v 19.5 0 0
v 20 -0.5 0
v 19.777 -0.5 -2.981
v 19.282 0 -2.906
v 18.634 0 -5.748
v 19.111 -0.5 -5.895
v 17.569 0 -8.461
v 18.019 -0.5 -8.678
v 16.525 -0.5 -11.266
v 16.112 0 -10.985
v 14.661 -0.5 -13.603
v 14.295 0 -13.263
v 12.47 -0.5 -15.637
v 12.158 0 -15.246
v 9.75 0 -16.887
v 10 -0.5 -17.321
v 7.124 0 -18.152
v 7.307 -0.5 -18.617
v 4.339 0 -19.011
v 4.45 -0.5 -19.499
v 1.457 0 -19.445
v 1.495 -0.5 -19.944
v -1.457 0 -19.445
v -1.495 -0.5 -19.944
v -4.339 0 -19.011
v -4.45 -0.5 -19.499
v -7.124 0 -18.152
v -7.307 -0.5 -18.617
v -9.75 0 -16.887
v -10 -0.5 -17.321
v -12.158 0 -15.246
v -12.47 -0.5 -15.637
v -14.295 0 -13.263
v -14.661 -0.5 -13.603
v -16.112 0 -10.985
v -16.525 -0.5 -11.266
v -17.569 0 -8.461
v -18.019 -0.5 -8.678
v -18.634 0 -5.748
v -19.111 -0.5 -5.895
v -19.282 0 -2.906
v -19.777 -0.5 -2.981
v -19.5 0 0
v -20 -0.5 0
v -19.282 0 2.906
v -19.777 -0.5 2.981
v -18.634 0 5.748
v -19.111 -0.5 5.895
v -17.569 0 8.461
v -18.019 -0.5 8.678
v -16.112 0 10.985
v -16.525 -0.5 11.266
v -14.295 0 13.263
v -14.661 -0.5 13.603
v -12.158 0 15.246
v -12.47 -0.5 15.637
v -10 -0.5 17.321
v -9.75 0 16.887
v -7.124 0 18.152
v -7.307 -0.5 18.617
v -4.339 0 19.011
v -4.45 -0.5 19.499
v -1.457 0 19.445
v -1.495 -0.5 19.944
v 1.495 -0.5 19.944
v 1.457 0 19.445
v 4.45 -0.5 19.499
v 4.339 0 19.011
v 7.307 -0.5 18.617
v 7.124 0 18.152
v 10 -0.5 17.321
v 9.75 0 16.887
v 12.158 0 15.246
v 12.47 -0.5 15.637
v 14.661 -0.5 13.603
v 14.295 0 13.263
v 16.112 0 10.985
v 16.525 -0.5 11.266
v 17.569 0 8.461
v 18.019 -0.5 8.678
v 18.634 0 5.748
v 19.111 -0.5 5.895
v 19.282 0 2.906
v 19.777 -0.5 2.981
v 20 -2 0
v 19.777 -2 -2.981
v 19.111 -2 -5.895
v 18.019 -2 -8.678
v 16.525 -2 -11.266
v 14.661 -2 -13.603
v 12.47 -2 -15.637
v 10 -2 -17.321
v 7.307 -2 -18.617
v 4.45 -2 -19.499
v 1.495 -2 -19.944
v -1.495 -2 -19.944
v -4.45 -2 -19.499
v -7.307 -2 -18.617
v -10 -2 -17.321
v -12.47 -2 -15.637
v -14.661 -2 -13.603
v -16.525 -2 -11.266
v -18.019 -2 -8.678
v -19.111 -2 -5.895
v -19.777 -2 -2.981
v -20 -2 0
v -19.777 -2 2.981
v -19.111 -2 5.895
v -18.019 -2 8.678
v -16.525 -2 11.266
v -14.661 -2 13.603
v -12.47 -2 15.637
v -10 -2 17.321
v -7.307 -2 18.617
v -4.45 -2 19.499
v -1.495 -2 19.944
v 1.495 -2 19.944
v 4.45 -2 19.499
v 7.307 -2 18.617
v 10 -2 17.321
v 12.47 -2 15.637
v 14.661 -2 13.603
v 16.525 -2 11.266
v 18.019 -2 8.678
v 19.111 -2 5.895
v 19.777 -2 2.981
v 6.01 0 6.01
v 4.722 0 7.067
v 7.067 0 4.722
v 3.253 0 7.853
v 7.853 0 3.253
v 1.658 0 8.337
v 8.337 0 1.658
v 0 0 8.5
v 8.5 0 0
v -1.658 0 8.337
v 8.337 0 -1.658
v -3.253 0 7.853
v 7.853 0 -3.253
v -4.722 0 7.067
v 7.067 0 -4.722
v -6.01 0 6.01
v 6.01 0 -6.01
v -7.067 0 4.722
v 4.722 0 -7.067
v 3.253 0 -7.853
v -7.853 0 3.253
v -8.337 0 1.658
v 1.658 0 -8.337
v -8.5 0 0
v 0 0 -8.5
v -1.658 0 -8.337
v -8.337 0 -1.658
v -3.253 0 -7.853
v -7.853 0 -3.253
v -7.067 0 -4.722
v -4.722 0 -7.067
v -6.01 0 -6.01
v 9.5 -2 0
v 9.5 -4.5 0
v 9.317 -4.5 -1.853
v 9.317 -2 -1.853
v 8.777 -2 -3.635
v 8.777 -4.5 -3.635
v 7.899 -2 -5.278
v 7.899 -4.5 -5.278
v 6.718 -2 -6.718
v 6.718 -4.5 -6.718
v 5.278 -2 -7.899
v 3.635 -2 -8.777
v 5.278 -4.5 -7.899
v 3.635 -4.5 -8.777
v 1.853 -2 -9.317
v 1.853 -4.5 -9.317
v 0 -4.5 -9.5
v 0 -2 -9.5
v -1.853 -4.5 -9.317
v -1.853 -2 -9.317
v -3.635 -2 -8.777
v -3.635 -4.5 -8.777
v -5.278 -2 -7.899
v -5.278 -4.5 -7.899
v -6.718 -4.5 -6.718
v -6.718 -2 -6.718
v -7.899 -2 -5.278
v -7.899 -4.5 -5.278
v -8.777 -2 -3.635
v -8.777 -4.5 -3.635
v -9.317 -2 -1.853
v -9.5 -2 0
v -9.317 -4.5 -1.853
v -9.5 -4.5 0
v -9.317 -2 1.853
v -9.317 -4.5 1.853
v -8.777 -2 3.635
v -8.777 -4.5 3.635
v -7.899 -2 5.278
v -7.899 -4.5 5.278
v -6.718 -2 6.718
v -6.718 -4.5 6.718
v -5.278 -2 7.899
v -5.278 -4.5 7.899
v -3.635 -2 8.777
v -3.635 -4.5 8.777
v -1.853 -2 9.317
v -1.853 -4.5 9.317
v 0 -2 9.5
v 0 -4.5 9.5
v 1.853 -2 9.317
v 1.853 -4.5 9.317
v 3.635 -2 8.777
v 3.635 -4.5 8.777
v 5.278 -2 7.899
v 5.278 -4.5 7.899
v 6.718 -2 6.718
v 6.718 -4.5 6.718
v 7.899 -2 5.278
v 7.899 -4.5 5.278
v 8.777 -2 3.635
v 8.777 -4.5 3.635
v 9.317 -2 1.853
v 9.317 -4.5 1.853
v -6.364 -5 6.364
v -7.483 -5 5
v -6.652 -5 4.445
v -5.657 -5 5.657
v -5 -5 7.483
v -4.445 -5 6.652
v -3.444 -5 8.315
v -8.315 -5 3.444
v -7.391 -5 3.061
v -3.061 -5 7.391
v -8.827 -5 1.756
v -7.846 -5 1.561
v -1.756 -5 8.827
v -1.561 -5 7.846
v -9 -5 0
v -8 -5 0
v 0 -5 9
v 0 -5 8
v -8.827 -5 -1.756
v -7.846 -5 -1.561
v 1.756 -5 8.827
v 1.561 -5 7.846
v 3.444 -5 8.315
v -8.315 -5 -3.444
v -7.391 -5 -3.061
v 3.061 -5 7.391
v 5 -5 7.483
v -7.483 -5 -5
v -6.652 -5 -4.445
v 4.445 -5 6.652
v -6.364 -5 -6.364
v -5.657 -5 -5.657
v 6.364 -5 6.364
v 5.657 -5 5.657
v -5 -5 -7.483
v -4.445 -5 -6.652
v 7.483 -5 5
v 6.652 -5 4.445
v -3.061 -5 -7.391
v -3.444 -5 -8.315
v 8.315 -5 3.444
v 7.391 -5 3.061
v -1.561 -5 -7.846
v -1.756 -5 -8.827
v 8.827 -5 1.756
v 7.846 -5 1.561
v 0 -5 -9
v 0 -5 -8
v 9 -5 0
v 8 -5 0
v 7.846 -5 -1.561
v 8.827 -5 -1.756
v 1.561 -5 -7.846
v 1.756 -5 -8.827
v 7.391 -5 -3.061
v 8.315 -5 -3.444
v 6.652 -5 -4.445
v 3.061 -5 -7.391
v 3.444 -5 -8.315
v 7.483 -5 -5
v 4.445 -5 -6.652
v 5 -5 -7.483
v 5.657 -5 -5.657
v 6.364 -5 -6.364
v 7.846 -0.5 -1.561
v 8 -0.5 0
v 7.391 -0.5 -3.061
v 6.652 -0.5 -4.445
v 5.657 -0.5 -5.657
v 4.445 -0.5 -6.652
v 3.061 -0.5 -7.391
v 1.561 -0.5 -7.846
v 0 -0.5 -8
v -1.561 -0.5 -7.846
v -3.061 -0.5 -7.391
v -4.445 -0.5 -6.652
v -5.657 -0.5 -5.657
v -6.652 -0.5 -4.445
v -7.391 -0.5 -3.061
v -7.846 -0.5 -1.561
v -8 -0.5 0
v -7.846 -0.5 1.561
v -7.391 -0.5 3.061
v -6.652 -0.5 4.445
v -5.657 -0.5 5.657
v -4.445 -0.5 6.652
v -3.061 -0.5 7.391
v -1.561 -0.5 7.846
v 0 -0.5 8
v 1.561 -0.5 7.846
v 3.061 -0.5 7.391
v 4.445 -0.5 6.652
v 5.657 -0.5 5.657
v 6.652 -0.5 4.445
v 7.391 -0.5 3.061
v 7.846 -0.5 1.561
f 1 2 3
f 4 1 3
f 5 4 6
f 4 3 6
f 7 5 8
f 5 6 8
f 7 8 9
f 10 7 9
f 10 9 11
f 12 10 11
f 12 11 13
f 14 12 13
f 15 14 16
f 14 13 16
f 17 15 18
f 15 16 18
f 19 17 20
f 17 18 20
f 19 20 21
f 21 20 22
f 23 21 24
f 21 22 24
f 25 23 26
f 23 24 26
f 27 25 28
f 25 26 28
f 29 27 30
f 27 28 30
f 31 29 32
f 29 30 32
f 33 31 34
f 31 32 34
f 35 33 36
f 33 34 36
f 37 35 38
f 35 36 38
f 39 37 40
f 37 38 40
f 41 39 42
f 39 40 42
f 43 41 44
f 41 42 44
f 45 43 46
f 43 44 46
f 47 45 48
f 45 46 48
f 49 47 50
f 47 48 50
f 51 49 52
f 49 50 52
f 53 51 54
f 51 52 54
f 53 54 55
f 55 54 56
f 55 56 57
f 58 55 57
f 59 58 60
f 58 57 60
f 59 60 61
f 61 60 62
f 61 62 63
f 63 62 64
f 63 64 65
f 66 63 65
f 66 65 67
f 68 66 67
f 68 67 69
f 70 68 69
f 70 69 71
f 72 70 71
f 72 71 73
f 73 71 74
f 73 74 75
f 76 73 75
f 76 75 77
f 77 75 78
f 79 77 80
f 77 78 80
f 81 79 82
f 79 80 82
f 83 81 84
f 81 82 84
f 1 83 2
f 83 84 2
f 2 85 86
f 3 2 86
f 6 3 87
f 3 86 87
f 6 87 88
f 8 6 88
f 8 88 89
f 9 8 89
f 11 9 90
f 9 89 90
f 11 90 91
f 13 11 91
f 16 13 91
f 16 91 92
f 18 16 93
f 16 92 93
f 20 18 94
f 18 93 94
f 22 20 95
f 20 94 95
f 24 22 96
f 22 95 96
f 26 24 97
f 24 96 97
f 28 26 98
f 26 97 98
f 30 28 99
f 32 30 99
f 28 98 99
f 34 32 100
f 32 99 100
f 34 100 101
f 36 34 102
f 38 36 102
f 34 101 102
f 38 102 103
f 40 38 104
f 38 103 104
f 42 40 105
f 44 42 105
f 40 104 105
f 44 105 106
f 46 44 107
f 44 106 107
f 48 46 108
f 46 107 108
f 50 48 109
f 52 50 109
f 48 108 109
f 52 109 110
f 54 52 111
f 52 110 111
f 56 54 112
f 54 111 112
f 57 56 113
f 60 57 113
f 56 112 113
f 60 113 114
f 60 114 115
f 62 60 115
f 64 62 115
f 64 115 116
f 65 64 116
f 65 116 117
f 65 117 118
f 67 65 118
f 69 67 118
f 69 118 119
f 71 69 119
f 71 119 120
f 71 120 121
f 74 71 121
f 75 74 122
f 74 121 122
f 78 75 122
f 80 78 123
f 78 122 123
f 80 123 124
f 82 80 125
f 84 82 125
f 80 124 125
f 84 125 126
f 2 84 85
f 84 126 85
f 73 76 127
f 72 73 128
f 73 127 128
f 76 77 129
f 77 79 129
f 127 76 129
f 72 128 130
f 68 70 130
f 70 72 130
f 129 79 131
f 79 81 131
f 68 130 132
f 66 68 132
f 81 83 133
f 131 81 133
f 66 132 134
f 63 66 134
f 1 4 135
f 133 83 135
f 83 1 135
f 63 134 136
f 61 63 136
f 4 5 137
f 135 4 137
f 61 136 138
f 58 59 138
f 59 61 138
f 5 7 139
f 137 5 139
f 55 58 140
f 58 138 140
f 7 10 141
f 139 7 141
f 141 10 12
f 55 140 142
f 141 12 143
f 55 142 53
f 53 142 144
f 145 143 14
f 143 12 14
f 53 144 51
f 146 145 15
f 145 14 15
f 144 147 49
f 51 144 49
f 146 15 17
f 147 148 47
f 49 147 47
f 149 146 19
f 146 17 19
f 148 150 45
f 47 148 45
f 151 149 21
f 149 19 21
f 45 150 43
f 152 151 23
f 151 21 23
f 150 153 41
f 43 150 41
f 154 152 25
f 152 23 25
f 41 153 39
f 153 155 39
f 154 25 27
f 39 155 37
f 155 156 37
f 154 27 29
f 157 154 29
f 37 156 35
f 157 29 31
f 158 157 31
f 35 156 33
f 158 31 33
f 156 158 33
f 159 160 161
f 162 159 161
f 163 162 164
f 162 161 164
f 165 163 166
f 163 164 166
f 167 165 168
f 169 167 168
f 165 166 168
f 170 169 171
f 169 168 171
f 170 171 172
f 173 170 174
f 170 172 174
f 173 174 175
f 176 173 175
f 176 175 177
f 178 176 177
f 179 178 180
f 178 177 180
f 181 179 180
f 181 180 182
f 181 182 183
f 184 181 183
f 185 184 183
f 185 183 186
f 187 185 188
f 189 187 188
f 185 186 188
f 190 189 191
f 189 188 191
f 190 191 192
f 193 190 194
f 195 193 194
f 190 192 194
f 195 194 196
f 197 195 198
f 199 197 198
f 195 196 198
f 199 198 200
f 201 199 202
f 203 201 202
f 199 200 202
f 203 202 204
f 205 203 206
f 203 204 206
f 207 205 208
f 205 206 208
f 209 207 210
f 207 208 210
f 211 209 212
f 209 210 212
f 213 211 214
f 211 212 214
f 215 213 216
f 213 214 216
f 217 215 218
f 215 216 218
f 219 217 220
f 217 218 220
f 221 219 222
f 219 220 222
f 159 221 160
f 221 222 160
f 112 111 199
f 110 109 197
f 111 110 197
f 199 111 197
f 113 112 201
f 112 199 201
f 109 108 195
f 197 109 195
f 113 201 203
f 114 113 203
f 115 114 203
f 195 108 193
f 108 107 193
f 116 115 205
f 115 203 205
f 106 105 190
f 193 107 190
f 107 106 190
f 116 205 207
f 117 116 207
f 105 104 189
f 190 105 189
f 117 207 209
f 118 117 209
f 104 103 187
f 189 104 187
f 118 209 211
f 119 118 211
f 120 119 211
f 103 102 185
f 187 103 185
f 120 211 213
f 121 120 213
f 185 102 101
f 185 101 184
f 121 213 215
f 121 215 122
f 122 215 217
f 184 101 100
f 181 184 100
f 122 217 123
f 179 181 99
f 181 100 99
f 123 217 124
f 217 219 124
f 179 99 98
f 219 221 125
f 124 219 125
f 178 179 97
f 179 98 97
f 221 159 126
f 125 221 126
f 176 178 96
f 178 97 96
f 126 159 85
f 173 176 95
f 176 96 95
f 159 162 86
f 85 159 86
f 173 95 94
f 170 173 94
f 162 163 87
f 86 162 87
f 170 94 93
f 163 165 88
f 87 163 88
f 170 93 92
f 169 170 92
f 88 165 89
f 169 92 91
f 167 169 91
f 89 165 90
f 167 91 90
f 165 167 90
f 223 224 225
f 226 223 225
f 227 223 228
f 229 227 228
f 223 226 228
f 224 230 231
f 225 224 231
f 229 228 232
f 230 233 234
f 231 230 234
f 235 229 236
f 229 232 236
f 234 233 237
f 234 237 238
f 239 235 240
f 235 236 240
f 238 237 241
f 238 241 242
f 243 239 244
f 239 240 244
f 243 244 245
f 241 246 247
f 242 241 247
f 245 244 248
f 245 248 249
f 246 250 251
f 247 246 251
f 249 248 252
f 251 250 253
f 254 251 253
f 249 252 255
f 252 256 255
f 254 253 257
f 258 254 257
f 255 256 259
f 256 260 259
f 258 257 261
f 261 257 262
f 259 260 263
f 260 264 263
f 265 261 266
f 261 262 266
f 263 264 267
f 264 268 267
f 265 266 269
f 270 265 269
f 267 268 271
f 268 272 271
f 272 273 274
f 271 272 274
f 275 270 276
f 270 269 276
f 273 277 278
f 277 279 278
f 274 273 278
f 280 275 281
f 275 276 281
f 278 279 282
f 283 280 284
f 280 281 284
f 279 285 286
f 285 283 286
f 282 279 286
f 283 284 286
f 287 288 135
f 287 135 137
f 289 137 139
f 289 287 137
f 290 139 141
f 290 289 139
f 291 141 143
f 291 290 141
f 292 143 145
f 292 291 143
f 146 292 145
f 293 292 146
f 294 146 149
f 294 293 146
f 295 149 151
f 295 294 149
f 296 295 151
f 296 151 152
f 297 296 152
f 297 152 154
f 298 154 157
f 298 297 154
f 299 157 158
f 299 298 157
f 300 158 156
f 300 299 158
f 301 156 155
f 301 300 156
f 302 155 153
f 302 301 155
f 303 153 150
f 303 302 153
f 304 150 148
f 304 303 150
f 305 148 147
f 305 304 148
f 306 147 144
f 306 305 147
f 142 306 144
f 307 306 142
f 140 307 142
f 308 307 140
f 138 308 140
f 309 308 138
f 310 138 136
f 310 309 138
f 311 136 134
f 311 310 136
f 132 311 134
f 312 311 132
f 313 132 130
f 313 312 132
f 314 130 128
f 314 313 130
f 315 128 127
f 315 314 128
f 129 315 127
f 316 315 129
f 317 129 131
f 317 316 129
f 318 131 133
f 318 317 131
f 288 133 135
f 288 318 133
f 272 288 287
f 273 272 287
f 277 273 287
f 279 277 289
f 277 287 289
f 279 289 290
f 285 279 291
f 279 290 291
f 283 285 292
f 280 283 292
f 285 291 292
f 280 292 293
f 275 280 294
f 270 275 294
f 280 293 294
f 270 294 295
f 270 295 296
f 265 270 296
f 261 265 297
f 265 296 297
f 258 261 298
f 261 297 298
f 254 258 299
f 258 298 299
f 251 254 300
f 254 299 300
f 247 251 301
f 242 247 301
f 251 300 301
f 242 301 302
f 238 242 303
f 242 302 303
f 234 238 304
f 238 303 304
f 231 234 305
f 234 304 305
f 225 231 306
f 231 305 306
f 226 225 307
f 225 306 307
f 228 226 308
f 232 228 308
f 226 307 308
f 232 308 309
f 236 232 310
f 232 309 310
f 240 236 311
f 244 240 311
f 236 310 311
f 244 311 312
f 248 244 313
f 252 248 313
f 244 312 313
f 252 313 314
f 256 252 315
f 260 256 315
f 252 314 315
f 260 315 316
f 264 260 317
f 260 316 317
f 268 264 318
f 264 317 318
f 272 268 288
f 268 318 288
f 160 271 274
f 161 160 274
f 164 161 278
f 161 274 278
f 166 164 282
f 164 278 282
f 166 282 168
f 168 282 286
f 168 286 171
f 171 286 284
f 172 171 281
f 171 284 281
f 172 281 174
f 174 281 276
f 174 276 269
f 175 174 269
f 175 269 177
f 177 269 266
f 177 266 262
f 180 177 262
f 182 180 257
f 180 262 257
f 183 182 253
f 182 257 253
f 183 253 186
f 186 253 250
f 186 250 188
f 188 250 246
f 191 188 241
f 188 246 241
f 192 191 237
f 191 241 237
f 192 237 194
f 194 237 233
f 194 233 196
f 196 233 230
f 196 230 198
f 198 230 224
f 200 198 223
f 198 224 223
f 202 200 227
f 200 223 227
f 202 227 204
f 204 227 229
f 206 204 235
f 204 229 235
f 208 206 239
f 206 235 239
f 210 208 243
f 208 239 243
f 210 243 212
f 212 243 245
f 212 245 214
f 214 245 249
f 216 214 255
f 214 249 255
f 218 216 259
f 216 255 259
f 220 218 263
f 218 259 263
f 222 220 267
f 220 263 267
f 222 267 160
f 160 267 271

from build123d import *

# Parameters (mm, degrees)
SMUSSO1_SIZE = 0.5


with BuildPart() as part:
    # Schizzo1 → Rivoluzione1 (revolve)
    with BuildSketch(Plane.XY):
        Polygon((8, 0), (20, 0), (20, -2), (9.5, -2), (9.5, -5), (8, -5), align=None)
    revolve(axis=Axis((0, -42.973726115, 0), (0, 1, 0)))

    # Smusso1
    smusso1_edges = [part.edges().sort_by_distance(p)[0] for p in [
        (-9.5, -5, 0),
        (-20, 0, 0),
        (-8, 0, 0),
    ]]
    chamfer(smusso1_edges, length=SMUSSO1_SIZE)


solid = part.part
